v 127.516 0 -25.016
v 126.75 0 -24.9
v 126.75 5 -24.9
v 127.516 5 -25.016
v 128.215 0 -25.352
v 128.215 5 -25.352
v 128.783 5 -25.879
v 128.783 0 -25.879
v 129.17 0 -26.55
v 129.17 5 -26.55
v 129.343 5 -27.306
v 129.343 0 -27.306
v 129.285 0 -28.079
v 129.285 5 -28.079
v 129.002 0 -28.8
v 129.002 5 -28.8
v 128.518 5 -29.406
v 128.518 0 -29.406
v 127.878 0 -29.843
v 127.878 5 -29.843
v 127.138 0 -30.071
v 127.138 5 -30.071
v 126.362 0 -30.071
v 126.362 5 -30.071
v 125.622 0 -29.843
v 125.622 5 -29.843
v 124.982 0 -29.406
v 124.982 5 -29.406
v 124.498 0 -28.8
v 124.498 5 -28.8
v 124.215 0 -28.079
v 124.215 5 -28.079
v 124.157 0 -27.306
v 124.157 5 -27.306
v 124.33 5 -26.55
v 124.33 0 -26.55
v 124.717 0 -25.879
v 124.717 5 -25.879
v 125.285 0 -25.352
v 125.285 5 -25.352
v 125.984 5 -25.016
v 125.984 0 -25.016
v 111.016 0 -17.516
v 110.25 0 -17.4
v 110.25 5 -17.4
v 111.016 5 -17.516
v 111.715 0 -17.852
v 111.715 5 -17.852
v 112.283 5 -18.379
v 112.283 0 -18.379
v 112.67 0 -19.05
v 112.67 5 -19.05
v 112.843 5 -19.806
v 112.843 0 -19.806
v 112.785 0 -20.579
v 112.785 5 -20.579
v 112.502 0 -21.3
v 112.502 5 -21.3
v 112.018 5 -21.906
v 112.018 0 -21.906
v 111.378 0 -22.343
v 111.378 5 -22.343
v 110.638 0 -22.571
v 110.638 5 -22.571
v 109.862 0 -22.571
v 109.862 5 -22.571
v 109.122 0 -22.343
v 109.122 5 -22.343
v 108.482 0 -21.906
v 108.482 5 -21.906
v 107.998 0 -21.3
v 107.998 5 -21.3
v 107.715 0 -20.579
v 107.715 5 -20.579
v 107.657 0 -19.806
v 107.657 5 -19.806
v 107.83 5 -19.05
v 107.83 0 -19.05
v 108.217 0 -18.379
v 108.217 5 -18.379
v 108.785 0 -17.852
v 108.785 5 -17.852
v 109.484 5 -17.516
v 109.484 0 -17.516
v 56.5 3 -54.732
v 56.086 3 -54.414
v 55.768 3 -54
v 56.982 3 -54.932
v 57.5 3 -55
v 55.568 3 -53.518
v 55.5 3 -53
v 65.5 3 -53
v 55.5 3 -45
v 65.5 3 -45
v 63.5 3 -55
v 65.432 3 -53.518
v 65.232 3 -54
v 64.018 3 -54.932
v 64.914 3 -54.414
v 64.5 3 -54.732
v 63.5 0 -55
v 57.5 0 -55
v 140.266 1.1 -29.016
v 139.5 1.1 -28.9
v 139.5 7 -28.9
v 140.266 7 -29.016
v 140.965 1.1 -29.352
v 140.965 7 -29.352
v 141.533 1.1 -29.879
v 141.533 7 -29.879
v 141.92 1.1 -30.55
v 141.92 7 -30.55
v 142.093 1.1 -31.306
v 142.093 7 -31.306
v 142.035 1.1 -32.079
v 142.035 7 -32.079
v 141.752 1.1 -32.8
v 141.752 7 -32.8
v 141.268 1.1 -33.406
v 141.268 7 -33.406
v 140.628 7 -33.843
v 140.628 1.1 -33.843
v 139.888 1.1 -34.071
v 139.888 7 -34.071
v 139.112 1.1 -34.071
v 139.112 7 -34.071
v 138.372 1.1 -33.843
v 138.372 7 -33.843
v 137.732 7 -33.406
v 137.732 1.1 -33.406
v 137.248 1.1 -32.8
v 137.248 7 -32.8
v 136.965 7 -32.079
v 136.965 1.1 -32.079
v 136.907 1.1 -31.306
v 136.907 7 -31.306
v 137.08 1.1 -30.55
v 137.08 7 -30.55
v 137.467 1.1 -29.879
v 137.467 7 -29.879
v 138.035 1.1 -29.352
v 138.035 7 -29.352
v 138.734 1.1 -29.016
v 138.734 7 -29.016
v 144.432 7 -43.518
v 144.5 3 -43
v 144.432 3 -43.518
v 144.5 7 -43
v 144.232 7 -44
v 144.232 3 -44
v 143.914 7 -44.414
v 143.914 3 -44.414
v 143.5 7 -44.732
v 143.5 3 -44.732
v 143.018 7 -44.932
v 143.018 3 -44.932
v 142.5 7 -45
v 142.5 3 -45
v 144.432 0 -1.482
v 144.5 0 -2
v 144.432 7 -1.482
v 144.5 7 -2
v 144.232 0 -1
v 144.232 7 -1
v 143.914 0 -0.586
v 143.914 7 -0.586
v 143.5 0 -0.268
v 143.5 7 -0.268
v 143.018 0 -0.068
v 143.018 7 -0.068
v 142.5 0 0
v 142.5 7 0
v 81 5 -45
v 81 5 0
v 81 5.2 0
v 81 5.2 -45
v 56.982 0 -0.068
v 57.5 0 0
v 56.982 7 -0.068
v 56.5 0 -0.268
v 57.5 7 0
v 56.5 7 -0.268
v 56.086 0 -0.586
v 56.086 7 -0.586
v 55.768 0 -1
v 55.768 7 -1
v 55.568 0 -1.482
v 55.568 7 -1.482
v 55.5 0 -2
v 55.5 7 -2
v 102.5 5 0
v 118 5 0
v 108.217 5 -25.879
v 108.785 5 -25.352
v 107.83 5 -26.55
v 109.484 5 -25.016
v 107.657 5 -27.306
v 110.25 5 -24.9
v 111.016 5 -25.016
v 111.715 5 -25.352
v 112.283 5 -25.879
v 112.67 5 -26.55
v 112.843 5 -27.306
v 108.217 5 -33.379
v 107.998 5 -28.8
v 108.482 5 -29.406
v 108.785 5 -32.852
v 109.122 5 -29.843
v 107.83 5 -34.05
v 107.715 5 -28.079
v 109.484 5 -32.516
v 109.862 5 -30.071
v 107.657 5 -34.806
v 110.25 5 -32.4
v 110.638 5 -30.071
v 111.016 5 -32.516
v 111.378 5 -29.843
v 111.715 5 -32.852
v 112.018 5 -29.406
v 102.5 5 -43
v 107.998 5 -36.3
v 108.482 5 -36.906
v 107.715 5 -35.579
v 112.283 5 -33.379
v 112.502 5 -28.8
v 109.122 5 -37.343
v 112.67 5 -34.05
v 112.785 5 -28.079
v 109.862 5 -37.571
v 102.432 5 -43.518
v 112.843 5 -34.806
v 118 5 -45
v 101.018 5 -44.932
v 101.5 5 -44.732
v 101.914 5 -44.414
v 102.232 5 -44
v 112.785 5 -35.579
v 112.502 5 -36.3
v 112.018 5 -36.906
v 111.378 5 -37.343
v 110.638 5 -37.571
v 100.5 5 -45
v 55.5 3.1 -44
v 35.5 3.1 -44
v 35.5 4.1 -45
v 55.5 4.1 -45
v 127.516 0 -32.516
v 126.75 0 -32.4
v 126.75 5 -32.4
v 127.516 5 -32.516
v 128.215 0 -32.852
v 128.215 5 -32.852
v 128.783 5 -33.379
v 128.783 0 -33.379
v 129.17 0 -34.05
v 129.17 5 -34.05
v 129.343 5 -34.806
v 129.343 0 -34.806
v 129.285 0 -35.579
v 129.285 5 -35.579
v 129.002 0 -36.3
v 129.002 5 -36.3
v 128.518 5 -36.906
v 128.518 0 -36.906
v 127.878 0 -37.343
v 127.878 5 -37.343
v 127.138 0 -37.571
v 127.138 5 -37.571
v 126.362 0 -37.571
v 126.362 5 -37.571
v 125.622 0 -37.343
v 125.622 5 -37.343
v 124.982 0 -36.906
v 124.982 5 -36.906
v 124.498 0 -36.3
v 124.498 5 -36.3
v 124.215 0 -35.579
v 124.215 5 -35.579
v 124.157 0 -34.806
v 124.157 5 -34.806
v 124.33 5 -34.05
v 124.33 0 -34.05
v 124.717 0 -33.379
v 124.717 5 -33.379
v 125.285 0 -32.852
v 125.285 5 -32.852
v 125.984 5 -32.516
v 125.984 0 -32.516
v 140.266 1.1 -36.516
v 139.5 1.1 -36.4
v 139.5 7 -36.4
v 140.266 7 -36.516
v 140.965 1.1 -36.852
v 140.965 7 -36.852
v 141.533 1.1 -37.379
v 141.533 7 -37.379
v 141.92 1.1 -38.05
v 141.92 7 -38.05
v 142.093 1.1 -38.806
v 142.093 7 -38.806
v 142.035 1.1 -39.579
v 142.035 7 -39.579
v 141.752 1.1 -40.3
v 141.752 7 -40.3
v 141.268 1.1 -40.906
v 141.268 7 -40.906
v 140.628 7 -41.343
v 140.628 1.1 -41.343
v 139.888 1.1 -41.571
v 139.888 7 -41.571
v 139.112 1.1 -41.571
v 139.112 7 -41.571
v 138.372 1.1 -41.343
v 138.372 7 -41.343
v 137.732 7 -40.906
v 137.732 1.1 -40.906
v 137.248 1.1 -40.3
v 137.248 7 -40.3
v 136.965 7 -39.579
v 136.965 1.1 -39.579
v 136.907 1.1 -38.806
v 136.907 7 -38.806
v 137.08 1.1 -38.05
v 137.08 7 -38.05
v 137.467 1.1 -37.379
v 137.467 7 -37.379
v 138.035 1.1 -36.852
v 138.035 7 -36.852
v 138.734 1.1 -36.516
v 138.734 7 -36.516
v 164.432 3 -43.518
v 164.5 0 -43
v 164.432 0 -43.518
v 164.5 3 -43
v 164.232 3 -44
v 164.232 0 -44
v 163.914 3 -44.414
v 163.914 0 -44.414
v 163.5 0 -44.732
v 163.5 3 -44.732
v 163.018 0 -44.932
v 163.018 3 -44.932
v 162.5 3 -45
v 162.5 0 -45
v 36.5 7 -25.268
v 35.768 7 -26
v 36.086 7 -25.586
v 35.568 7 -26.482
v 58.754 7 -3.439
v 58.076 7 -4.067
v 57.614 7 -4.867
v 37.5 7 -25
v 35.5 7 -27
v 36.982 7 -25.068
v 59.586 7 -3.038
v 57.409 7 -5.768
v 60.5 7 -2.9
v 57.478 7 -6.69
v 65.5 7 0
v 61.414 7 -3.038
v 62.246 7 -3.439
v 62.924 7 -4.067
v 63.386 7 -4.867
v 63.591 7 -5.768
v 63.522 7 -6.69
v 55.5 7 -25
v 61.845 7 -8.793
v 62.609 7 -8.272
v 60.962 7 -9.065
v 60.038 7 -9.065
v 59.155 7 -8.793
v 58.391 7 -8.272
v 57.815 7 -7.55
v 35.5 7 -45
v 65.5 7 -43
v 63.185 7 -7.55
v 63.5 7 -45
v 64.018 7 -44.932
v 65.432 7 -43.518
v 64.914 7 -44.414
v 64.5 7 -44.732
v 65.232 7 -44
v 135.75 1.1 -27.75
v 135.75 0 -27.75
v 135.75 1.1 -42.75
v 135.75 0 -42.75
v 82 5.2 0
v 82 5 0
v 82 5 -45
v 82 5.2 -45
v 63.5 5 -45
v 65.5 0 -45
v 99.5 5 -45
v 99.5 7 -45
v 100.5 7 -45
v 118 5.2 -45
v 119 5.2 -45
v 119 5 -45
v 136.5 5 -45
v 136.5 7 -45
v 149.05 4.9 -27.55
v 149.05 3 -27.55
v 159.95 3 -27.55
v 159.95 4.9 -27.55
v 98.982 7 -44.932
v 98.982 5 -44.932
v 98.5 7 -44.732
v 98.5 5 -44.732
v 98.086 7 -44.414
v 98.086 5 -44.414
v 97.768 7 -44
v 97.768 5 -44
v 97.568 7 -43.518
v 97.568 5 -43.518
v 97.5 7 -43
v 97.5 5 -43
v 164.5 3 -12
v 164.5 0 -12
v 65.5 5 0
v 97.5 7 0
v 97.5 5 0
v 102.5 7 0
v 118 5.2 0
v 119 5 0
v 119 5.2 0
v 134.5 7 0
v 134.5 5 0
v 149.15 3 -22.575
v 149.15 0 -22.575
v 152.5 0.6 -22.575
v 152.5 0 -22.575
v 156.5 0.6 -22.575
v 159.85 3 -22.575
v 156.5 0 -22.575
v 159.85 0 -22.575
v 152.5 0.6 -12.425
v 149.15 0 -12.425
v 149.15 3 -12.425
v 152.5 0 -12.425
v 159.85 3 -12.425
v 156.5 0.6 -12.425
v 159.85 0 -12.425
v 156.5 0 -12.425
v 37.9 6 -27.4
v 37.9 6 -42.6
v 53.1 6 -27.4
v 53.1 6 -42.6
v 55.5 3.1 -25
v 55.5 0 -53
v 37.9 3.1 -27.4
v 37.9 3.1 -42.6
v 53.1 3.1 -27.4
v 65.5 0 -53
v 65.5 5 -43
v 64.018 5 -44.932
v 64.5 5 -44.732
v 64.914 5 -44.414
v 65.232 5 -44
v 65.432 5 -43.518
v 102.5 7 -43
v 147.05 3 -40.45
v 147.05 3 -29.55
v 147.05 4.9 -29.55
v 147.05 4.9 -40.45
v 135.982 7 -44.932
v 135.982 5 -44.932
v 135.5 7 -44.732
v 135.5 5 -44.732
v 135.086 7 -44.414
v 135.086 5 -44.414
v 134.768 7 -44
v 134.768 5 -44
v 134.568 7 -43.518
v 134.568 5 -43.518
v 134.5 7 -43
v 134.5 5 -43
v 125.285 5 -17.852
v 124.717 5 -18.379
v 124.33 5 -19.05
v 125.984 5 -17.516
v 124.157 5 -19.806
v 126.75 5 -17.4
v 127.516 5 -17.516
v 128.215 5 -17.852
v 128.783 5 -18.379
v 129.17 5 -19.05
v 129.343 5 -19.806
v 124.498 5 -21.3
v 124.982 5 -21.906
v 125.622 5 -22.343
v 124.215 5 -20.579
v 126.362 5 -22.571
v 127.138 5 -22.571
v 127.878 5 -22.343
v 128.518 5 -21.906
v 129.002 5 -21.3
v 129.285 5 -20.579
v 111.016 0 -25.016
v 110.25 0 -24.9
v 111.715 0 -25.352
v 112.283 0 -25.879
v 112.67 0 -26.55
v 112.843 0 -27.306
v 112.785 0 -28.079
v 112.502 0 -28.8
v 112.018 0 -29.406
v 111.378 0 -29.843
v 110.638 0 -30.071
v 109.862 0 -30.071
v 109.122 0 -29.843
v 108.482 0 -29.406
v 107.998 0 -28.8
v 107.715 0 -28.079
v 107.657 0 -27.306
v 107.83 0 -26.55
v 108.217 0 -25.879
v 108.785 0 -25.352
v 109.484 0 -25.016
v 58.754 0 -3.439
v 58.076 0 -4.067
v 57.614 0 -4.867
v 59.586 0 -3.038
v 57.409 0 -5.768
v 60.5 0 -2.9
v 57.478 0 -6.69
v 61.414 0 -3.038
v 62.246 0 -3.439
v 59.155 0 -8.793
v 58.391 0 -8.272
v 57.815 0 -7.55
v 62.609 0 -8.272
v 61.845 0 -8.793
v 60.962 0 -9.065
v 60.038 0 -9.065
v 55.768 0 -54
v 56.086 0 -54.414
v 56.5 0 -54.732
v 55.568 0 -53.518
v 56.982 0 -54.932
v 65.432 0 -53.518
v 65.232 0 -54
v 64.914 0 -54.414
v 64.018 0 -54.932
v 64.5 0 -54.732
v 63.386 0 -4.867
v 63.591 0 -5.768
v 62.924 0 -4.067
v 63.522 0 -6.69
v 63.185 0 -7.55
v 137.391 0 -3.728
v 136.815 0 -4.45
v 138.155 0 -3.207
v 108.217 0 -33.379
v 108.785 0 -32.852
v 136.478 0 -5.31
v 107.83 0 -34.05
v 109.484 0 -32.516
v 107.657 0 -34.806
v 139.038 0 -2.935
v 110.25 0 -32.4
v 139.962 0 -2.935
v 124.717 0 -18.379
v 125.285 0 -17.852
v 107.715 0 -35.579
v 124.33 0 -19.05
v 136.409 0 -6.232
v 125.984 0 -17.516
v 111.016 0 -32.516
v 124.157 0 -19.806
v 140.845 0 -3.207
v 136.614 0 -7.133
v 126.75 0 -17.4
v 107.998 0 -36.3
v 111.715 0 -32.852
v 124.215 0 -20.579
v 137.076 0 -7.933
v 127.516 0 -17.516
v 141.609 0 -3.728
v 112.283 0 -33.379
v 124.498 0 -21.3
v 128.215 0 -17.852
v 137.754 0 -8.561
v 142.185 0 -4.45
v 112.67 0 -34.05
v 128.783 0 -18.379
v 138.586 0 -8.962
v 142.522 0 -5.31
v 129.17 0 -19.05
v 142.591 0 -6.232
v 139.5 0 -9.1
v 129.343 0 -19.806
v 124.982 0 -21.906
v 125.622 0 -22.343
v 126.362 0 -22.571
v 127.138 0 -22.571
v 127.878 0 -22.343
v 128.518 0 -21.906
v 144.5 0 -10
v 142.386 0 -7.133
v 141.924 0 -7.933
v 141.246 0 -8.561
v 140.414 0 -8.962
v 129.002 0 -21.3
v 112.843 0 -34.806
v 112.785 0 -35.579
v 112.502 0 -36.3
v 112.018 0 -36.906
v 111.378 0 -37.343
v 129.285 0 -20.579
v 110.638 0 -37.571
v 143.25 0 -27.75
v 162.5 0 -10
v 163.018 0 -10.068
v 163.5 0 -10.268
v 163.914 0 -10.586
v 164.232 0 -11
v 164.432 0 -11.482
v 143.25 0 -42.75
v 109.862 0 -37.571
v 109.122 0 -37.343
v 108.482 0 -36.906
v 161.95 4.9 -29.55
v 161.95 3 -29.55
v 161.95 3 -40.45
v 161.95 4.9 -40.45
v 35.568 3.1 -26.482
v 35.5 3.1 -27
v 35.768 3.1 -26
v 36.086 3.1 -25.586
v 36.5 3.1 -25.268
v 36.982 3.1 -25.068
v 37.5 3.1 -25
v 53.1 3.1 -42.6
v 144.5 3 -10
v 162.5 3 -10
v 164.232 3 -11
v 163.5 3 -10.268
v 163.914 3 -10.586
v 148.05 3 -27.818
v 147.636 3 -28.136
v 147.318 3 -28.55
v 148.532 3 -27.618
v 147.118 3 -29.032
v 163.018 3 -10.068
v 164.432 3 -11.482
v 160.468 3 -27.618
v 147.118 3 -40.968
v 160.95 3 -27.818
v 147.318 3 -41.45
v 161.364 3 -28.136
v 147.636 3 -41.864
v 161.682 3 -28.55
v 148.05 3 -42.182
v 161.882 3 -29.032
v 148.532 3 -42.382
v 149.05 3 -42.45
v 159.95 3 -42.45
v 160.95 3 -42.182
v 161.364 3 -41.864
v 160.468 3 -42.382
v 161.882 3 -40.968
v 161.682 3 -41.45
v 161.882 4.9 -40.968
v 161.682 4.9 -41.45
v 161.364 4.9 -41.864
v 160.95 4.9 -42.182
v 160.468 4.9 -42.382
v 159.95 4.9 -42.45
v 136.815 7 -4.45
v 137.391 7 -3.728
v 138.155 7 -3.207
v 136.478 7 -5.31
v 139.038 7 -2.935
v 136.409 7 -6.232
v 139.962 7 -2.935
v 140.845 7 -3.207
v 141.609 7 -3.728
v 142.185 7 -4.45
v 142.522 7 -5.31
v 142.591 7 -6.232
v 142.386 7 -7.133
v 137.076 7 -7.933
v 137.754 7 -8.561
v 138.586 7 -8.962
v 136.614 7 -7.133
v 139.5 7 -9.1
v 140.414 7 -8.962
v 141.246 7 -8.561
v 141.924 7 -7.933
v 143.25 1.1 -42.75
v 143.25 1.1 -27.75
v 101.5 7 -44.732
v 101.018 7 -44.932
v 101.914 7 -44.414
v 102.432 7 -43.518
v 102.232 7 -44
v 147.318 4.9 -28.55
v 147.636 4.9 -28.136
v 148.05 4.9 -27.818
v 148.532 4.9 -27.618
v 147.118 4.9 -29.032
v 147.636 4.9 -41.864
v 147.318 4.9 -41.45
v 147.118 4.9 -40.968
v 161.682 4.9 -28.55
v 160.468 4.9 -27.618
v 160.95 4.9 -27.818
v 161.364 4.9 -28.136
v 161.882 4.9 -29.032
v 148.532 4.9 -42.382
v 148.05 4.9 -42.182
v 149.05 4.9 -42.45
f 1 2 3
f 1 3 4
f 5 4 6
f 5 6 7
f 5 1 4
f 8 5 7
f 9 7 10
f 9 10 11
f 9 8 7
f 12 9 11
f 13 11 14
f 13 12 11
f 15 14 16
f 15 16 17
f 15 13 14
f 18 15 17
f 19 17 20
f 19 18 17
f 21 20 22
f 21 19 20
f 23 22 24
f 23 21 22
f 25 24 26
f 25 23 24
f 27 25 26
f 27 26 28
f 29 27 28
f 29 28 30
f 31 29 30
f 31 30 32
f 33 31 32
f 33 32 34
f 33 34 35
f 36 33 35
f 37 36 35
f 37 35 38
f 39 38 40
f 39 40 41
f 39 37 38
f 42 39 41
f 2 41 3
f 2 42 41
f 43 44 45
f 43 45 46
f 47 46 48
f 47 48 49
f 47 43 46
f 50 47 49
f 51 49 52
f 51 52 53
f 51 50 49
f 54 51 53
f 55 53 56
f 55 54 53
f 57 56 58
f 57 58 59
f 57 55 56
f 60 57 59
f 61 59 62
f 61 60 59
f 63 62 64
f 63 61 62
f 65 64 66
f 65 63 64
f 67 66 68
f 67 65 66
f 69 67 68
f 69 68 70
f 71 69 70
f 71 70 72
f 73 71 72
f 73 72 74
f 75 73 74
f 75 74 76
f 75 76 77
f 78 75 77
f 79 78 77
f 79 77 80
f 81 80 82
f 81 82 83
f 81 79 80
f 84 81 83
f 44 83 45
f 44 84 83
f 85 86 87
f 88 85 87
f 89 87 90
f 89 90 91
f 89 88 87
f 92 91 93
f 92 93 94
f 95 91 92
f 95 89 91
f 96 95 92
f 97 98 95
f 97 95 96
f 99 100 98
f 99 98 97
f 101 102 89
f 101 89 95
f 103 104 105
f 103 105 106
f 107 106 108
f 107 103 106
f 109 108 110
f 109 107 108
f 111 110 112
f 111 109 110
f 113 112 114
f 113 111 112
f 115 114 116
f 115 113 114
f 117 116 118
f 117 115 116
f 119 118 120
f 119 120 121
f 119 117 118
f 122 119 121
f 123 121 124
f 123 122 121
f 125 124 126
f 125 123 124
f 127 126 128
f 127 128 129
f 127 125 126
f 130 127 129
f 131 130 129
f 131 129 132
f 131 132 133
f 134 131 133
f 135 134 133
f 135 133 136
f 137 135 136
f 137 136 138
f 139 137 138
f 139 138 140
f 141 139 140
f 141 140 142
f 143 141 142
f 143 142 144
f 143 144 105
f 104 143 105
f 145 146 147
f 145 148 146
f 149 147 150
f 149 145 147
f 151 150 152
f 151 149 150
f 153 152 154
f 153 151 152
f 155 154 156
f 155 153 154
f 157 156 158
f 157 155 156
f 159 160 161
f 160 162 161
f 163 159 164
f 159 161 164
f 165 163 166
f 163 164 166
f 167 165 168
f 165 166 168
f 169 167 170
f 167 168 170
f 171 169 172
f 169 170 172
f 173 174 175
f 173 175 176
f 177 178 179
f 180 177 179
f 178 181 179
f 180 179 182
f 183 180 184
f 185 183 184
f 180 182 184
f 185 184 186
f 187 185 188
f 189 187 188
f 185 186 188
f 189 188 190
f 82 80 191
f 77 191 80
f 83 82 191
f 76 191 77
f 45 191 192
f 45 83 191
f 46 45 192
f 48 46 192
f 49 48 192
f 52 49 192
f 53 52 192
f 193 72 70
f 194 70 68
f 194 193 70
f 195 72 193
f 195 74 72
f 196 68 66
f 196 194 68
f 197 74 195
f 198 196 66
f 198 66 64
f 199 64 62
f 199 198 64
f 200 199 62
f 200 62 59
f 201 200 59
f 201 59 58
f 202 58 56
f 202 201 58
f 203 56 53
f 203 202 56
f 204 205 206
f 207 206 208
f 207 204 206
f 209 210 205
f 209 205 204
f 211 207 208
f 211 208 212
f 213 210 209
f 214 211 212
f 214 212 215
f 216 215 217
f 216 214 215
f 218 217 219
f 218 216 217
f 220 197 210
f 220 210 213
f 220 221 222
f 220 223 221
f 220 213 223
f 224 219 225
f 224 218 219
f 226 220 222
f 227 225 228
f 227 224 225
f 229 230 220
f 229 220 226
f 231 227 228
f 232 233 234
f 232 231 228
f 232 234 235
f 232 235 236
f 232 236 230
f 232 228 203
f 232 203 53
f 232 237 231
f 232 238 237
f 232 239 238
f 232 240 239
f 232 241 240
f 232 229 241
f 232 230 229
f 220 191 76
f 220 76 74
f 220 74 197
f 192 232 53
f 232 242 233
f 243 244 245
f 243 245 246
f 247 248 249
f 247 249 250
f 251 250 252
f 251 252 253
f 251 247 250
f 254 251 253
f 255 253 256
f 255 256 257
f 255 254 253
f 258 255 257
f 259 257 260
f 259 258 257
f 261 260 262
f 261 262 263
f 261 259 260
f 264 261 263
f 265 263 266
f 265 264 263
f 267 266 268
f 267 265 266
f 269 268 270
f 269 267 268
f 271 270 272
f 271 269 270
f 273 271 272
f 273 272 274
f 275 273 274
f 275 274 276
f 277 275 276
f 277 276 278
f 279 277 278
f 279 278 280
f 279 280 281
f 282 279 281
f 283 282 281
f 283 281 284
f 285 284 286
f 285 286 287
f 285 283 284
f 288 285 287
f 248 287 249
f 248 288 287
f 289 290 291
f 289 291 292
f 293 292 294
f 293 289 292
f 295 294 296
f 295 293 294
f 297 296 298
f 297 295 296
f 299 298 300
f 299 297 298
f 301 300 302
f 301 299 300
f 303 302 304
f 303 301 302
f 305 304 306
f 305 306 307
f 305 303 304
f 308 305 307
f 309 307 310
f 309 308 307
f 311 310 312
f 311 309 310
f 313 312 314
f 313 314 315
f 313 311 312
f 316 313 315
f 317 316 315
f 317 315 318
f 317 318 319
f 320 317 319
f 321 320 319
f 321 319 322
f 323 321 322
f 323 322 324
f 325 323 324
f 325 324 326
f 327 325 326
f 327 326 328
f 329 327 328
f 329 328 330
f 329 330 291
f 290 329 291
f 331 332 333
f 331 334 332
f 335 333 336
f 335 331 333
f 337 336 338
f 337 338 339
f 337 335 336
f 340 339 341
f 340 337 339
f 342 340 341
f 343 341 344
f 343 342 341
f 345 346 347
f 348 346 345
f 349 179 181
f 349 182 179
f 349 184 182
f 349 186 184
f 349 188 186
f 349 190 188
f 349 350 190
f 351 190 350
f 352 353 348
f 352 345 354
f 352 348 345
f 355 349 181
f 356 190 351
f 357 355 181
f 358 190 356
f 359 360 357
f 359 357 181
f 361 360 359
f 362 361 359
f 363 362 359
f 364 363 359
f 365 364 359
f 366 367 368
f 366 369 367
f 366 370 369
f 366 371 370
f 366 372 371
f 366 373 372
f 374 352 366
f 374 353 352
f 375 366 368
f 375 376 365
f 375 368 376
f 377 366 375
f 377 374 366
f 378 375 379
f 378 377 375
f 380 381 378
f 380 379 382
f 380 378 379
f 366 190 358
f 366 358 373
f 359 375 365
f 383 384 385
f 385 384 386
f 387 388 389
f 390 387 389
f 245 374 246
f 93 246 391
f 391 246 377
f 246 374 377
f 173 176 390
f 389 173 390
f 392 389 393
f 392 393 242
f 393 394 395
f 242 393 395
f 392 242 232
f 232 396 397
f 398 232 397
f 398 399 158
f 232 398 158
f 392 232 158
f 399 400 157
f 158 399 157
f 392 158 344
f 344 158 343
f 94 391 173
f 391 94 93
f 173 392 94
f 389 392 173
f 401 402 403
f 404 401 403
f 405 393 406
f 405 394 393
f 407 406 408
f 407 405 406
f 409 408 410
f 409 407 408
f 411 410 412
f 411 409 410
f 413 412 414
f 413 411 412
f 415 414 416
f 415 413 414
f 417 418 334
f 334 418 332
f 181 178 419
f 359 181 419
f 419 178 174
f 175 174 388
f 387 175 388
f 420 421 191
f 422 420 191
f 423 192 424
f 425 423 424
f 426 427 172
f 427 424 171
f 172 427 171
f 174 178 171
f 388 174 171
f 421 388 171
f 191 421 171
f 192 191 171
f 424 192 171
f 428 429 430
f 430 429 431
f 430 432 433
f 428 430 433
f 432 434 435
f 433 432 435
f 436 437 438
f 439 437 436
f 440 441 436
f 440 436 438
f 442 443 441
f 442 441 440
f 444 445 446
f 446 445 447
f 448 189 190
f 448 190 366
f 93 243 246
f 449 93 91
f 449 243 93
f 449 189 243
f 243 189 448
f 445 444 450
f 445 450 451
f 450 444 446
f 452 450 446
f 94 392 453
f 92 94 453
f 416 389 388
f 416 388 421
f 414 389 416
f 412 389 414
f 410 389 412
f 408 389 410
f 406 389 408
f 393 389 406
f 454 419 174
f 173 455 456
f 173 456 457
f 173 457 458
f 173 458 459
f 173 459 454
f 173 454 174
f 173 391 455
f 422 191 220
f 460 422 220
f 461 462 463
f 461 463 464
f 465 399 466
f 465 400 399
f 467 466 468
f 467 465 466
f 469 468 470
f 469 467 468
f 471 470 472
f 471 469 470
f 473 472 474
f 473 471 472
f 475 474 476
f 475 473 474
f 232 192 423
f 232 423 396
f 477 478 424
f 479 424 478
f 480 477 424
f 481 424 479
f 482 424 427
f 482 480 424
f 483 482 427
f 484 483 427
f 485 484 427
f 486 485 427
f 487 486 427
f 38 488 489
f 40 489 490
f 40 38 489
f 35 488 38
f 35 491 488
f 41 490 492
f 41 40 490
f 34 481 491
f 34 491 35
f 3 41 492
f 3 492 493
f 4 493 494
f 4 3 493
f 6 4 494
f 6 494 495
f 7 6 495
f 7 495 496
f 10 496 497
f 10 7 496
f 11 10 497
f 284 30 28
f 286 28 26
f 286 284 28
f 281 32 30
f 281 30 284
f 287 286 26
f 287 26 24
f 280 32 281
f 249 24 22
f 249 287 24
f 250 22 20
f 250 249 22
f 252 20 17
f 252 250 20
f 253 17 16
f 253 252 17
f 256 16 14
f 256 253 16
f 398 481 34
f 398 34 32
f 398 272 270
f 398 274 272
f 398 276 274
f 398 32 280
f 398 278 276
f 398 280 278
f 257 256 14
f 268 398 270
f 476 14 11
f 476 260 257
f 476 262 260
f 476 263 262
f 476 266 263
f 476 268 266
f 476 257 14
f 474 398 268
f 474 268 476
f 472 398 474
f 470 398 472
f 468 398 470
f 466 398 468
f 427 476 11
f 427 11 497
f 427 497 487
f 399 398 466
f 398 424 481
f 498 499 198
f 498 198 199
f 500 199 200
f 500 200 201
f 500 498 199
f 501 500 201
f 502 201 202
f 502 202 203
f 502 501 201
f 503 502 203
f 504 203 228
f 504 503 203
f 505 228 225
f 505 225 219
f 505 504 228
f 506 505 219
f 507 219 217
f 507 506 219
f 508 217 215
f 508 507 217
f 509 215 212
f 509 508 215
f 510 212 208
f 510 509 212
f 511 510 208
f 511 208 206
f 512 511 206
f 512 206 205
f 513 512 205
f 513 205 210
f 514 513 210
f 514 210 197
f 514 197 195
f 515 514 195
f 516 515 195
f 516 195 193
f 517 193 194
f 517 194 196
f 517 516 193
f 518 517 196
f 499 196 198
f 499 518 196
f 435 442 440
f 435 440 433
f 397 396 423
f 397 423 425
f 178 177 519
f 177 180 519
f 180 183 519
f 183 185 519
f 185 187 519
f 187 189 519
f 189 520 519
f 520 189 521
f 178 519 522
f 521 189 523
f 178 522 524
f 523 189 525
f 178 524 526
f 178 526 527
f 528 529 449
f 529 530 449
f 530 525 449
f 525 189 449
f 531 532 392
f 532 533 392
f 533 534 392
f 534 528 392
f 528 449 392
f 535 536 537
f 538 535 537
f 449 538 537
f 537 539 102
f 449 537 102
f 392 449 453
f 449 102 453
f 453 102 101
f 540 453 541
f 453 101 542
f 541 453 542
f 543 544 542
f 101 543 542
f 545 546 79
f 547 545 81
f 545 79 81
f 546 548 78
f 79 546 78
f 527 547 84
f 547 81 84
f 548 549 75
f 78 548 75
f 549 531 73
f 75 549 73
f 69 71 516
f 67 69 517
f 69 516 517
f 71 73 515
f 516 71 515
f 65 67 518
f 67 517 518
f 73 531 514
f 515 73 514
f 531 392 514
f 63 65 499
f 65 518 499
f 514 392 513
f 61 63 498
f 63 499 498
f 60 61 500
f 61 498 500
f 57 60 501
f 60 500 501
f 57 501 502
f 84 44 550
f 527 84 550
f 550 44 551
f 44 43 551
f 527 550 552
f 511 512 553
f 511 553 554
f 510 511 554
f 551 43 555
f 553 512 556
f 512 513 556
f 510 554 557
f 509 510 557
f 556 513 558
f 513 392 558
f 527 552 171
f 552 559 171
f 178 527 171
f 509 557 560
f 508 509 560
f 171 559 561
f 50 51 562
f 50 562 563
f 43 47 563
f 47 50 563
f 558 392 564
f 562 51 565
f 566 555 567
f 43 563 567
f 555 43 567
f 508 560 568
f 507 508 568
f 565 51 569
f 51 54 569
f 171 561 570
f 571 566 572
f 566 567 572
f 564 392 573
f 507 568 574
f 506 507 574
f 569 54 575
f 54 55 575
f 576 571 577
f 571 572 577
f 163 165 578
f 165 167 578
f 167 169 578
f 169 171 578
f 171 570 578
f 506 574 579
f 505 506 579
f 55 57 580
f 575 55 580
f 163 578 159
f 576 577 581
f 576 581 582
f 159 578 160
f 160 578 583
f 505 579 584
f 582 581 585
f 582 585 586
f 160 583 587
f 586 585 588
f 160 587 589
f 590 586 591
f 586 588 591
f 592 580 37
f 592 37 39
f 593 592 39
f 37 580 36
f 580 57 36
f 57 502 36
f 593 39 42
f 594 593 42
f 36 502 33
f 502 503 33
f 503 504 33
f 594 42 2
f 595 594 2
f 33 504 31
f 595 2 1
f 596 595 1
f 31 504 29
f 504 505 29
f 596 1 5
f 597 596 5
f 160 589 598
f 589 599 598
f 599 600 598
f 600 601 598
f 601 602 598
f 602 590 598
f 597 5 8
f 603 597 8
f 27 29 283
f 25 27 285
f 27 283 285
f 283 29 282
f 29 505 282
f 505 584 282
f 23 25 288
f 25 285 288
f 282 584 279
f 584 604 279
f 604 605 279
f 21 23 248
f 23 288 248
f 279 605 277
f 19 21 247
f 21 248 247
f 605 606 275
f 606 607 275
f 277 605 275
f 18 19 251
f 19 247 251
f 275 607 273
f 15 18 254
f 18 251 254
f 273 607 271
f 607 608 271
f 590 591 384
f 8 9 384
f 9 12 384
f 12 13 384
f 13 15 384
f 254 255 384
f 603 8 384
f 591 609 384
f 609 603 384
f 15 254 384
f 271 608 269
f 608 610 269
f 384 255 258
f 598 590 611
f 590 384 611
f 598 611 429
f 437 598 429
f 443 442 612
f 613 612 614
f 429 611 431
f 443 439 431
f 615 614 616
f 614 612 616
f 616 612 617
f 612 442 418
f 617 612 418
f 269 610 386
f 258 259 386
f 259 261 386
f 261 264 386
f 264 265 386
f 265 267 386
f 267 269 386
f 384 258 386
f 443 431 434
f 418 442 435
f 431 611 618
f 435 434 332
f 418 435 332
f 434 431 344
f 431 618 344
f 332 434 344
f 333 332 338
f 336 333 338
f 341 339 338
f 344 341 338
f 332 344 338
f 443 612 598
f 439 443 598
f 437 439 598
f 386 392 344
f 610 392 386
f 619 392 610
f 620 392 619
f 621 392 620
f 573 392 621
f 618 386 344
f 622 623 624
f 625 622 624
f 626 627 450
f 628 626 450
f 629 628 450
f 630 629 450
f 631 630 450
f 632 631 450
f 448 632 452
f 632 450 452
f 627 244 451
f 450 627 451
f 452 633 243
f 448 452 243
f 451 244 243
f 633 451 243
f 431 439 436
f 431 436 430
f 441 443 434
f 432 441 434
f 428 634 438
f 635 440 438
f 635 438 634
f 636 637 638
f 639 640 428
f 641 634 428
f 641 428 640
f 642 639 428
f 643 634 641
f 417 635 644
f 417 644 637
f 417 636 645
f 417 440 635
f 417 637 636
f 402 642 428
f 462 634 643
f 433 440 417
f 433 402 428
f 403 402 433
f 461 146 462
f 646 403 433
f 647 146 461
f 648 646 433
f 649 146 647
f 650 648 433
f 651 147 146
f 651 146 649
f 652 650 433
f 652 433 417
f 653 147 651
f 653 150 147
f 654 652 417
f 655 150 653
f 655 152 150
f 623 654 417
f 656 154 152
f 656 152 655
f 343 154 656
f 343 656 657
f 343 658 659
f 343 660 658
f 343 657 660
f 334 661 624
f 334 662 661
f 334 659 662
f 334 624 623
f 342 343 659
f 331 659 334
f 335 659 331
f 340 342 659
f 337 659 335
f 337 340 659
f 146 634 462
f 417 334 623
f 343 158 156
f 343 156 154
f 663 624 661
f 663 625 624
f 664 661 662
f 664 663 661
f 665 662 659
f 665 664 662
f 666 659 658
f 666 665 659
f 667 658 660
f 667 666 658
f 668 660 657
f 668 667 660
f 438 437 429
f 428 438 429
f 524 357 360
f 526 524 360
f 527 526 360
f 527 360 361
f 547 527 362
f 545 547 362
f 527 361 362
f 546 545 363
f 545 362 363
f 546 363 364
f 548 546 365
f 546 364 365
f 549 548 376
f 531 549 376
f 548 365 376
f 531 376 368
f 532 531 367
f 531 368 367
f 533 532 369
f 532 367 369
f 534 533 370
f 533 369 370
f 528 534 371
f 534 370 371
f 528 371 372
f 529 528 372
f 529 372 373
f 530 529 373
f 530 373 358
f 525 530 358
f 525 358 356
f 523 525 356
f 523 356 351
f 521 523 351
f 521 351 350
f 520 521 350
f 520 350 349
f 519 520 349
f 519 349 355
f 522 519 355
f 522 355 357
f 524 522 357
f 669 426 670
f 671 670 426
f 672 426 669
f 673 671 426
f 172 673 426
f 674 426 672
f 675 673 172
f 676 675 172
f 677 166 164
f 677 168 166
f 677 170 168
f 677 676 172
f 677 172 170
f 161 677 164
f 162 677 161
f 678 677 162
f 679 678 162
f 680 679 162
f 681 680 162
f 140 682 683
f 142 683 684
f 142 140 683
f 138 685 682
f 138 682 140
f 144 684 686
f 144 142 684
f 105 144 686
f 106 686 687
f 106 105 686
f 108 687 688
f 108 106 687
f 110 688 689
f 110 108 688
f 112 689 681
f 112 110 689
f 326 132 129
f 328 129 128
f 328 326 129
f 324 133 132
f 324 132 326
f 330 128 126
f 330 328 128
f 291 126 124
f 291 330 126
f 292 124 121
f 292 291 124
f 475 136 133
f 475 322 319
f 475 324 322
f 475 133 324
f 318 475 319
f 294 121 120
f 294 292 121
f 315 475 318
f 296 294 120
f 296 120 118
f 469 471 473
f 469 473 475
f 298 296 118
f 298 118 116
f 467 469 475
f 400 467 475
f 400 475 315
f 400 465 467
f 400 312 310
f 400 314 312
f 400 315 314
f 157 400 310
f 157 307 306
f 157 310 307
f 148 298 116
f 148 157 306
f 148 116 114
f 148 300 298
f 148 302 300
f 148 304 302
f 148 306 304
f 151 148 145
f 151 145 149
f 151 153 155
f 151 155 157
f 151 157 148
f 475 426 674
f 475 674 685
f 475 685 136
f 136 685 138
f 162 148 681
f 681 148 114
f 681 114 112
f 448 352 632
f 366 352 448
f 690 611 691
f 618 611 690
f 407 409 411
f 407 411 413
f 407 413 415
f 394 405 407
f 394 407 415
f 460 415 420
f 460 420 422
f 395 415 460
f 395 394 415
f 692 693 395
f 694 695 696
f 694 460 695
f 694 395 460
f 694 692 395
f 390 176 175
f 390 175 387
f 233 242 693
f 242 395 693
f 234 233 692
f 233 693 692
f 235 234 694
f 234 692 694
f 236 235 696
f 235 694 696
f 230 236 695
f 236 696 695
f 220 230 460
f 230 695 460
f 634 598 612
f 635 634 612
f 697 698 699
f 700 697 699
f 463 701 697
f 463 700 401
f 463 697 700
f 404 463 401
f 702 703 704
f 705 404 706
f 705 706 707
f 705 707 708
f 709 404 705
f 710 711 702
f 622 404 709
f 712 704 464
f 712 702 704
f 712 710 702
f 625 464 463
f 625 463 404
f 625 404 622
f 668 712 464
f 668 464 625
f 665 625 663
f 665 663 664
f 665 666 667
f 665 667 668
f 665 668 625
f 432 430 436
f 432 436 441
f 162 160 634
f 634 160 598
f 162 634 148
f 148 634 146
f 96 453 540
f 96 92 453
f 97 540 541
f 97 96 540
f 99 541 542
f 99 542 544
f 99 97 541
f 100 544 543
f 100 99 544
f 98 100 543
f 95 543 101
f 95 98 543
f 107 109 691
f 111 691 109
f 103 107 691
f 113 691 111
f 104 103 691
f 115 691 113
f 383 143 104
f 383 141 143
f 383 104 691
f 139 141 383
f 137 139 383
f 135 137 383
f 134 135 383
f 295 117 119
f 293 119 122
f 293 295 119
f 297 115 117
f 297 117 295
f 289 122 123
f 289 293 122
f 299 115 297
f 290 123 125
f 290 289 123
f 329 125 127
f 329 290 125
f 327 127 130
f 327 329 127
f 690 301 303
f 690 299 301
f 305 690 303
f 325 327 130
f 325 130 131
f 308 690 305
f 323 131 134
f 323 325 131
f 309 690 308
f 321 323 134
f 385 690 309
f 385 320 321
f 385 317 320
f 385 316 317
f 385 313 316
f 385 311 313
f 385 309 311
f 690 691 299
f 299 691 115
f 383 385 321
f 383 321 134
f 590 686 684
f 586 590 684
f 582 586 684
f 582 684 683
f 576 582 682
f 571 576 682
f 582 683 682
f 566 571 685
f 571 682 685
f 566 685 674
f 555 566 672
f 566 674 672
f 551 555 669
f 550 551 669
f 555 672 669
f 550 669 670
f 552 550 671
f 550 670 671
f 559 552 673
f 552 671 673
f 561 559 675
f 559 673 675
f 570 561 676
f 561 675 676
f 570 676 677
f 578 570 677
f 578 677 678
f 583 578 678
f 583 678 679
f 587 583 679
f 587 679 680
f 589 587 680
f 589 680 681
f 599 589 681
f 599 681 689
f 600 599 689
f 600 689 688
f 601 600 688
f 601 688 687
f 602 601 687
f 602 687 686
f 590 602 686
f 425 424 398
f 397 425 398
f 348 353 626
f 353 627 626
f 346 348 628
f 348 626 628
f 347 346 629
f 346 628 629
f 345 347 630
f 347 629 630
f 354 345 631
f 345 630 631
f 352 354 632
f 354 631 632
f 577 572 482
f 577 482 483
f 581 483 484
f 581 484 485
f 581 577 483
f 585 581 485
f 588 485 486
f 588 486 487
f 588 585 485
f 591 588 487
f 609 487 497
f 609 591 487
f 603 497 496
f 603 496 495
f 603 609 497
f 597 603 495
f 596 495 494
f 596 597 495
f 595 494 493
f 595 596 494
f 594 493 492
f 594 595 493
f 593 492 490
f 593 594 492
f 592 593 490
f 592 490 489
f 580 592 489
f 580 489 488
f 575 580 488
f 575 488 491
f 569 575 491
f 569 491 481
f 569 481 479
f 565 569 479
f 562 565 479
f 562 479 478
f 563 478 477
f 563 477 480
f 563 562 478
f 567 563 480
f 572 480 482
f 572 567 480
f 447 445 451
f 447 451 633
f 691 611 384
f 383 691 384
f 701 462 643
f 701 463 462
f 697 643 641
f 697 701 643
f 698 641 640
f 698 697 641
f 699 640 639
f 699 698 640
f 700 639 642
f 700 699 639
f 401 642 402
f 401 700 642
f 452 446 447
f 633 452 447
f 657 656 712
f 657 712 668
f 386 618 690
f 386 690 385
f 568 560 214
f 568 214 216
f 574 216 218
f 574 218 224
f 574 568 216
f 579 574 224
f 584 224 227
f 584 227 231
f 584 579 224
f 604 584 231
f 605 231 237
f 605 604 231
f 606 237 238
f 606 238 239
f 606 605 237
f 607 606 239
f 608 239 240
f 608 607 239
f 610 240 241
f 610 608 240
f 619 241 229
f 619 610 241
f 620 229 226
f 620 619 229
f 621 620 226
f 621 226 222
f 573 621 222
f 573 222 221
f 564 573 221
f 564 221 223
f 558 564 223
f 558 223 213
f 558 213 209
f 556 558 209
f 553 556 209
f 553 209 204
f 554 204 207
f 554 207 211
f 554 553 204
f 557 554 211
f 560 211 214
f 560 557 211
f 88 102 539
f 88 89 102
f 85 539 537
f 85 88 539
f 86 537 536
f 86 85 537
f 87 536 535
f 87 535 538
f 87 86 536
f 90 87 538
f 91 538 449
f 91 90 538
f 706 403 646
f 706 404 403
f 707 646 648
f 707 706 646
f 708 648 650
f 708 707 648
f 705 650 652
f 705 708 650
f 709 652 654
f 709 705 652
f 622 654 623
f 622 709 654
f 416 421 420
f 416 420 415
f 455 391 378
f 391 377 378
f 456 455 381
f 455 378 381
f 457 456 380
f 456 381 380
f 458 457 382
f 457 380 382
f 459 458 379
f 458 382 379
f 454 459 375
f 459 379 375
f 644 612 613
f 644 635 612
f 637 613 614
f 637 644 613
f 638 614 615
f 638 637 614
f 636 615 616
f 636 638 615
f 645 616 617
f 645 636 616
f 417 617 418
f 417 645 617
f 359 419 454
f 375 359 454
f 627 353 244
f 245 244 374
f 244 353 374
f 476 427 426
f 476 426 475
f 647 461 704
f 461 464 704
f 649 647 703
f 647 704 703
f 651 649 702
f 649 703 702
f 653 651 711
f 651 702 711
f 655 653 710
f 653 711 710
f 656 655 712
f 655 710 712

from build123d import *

# Parameters (mm, degrees)
SKETCH1_W             = 15.5
SKETCH1_H             = 45
BOSS_EXTRUDE1_DEPTH   = 5
BOSS_EXTRUDE1_2_DEPTH = 5
SKETCH1_R             = 2.6
BOSS_EXTRUDE1_3_DEPTH = 5
BOSS_EXTRUDE1_4_DEPTH = 5
SKETCH1_3_W           = 1
SKETCH1_3_H           = 45
BOSS_EXTRUDE2_DEPTH   = 5.2
SKETCH1_4_W           = 5
SKETCH1_4_H           = 45
SKETCH1_4_W_2         = 10
SKETCH1_4_R           = 2.6
BOSS_EXTRUDE3_DEPTH   = 7
SKETCH2_W             = 7.5
SKETCH2_H             = 15
CUT_EXTRUDE1_DEPTH    = 1.1
SKETCH3_R             = 3.1
CUT_EXTRUDE2_DEPTH    = 152.506600516
SKETCH5_W             = 20
SKETCH5_H             = 20
SKETCH5_W_2           = 14.9
SKETCH5_H_2           = 14.9
BOSS_EXTRUDE4_DEPTH   = 3
SKETCH5_3_W           = 14.9
SKETCH5_3_H           = 14.9
BOSS_EXTRUDE5_DEPTH   = 4.9
BOSS_EXTRUDE6_START   = 7
SKETCH5_4_W           = 20
SKETCH5_4_H           = 20
SKETCH5_4_W_2         = 15.2
SKETCH5_4_H_2         = 15.2
BOSS_EXTRUDE6_DEPTH   = 3.9
BOSS_EXTRUDE7_START   = 7
SKETCH5_5_W           = 15.2
SKETCH5_5_H           = 15.2
BOSS_EXTRUDE7_DEPTH   = 1
FILLET1_R             = 2
BOSS_EXTRUDE8_START   = -7
SKETCH6_W             = 10
SKETCH6_H             = 10
BOSS_EXTRUDE8_DEPTH   = 3
CHAMFER1_SIZE         = 1
SKETCH8_W             = 20
SKETCH8_H             = 15
SKETCH8_W_2           = 10.7
SKETCH8_H_2           = 10.15
BOSS_EXTRUDE9_DEPTH   = 3
SKETCH8_3_W           = 4
SKETCH8_3_H           = 10.15
BOSS_EXTRUDE10_DEPTH  = 0.6
FILLET3_R             = 2


with BuildPart() as part:
    # Sketch1 → Boss-Extrude1 (new body)
    with BuildSketch(Plane(origin=(0, 0, 0), x_dir=(1, 0, 0), z_dir=(0, 1, 0))):
        with Locations((73.25, 22.5)):
            Rectangle(SKETCH1_W, SKETCH1_H)
    extrude(amount=BOSS_EXTRUDE1_DEPTH)



with BuildPart() as body_2:
    # Sketch1 → Boss-Extrude1 2 (new body)
    with BuildSketch(Plane(origin=(0, 0, 0), x_dir=(1, 0, 0), z_dir=(0, 1, 0))):
        with Locations((89.75, 22.5)):
            Rectangle(SKETCH1_W, SKETCH1_H)
    extrude(amount=BOSS_EXTRUDE1_2_DEPTH)


with BuildPart() as body_3:
    # Sketch1 → Boss-Extrude1 3 (new body)
    with BuildSketch(Plane(origin=(0, 0, 0), x_dir=(1, 0, 0), z_dir=(0, 1, 0))):
        with Locations((110.25, 22.5)):
            Rectangle(SKETCH1_W, SKETCH1_H)
        with Locations(Location((110.25, 20, 0), (0, 0, 270))):
            Circle(SKETCH1_R, mode=Mode.SUBTRACT)
        with Locations(Location((110.25, 27.5, 0), (0, 0, 270))):
            Circle(SKETCH1_R, mode=Mode.SUBTRACT)
        with Locations(Location((110.25, 35, 0), (0, 0, 270))):
            Circle(SKETCH1_R, mode=Mode.SUBTRACT)
    extrude(amount=BOSS_EXTRUDE1_3_DEPTH)


with BuildPart() as body_4:
    # Sketch1 → Boss-Extrude1 4 (new body)
    with BuildSketch(Plane(origin=(0, 0, 0), x_dir=(1, 0, 0), z_dir=(0, 1, 0))):
        with Locations((126.75, 22.5)):
            Rectangle(SKETCH1_W, SKETCH1_H)
        with Locations(Location((126.75, 20, 0), (0, 0, 270))):
            Circle(SKETCH1_R, mode=Mode.SUBTRACT)
        with Locations(Location((126.75, 27.5, 0), (0, 0, 270))):
            Circle(SKETCH1_R, mode=Mode.SUBTRACT)
        with Locations(Location((126.75, 35, 0), (0, 0, 270))):
            Circle(SKETCH1_R, mode=Mode.SUBTRACT)
    extrude(amount=BOSS_EXTRUDE1_4_DEPTH)


with BuildPart() as part_1:
    add(part.part)

    add(body_2.part)  # Boss-Extrude2 merges body 2

    add(body_3.part)  # Boss-Extrude2 merges body 3

    add(body_4.part)  # Boss-Extrude2 merges body 4
    # Sketch1<3> → Boss-Extrude2 (add)
    with BuildSketch(Plane(origin=(0, 0, 0), x_dir=(1, 0, 0), z_dir=(0, 1, 0))):
        with Locations((81.5, 22.5)):
            Rectangle(SKETCH1_3_W, SKETCH1_3_H)
        with Locations((118.5, 22.5)):
            Rectangle(SKETCH1_3_W, SKETCH1_3_H)
    extrude(amount=BOSS_EXTRUDE2_DEPTH)

    # Sketch1<4> → Boss-Extrude3 (add)
    # profile 1 of 3: a face of its own
    with BuildSketch(Plane(origin=(0, 0, 0), x_dir=(1, 0, 0), z_dir=(0, 1, 0))):
        with Locations((100, 22.5)):
            Rectangle(SKETCH1_4_W, SKETCH1_4_H)
    # profile 2 of 3: a face of its own
    with BuildSketch(Plane(origin=(0, 0, 0), x_dir=(1, 0, 0), z_dir=(0, 1, 0))):
        with Locations((139.5, 22.5)):
            Rectangle(SKETCH1_4_W_2, SKETCH1_4_H)
        with Locations(Location((139.5, 31.5, 0), (0, 0, 270))):
            Circle(SKETCH1_4_R, mode=Mode.SUBTRACT)
        with Locations(Location((139.5, 39, 0), (0, 0, 270))):
            Circle(SKETCH1_4_R, mode=Mode.SUBTRACT)
    # profile 3 of 3: a face of its own
    with BuildSketch(Plane(origin=(0, 0, 0), x_dir=(1, 0, 0), z_dir=(0, 1, 0))):
        with Locations((60.5, 22.5)):
            Rectangle(SKETCH1_4_W_2, SKETCH1_4_H)
    extrude(amount=BOSS_EXTRUDE3_DEPTH)

    # Sketch2 → Cut-Extrude1 (cut)
    with BuildSketch(Plane(origin=(0, 0, 0), x_dir=(-1, 0, 0), z_dir=(0, -1, 0))):
        with Locations((-139.5, 35.25)):
            Rectangle(SKETCH2_W, SKETCH2_H)
    extrude(amount=-CUT_EXTRUDE1_DEPTH, mode=Mode.SUBTRACT)

    # Sketch3 → Cut-Extrude2 (cut, through all)
    with BuildSketch(Plane(origin=(0, 7, 0), x_dir=(1, 0, 0), z_dir=(0, 1, 0))):
        with Locations(Location((60.5, 6, 0), (0, 0, 270))):
            Circle(SKETCH3_R)
        with Locations(Location((139.5, 6, 0), (0, 0, 90))):
            Circle(SKETCH3_R)
    extrude(amount=-CUT_EXTRUDE2_DEPTH, mode=Mode.SUBTRACT)

    # Sketch5 → Boss-Extrude4 (add)
    # profile 1 of 2: a face of its own
    with BuildSketch(Plane(origin=(0, 0, 0), x_dir=(1, 0, 0), z_dir=(0, 1, 0))):
        with Locations((154.5, 35)):
            Rectangle(SKETCH5_W, SKETCH5_H)
        with Locations((154.5, 35)):
            Rectangle(SKETCH5_W_2, SKETCH5_H_2, mode=Mode.SUBTRACT)
    # profile 2 of 2: a face of its own
    with BuildSketch(Plane(origin=(0, 0, 0), x_dir=(1, 0, 0), z_dir=(0, 1, 0))):
        with Locations((154.5, 35)):
            Rectangle(SKETCH5_W_2, SKETCH5_H_2)
    extrude(amount=BOSS_EXTRUDE4_DEPTH)

    # Sketch5<3> → Boss-Extrude5 (add)
    with BuildSketch(Plane(origin=(0, 0, 0), x_dir=(1, 0, 0), z_dir=(0, 1, 0))):
        with Locations((154.5, 35)):
            Rectangle(SKETCH5_3_W, SKETCH5_3_H)
    extrude(amount=BOSS_EXTRUDE5_DEPTH)

    # Sketch5<4> → Boss-Extrude6 (add)
    with BuildSketch(Plane(origin=(0, 0, 0), x_dir=(1, 0, 0), z_dir=(0, 1, 0)).offset(BOSS_EXTRUDE6_START)):
        with Locations((45.5, 35)):
            Rectangle(SKETCH5_4_W, SKETCH5_4_H)
        with Locations((45.5, 35)):
            Rectangle(SKETCH5_4_W_2, SKETCH5_4_H_2, mode=Mode.SUBTRACT)
    extrude(amount=-BOSS_EXTRUDE6_DEPTH)

    # Sketch5<5> → Boss-Extrude7 (add)
    with BuildSketch(Plane(origin=(0, 0, 0), x_dir=(1, 0, 0), z_dir=(0, 1, 0)).offset(BOSS_EXTRUDE7_START)):
        with Locations((45.5, 35)):
            Rectangle(SKETCH5_5_W, SKETCH5_5_H)
    extrude(amount=-BOSS_EXTRUDE7_DEPTH)

    # Fillet1
    fillet1_edges = [part_1.edges().sort_by_distance(p)[0] for p in [
        (161.95, 3.95, -42.45),
        (147.05, 3.95, -42.45),
        (147.05, 3.95, -27.55),
        (161.95, 3.95, -27.55),
    ]]
    fillet(fillet1_edges, radius=FILLET1_R)

    # Sketch6 → Boss-Extrude8 (add)
    with BuildSketch(Plane(origin=(0, 7, 0), x_dir=(1, 0, 0), z_dir=(0, 1, 0)).offset(BOSS_EXTRUDE8_START)):
        with Locations((60.5, 50)):
            Rectangle(SKETCH6_W, SKETCH6_H)
    extrude(amount=BOSS_EXTRUDE8_DEPTH)

    # Chamfer1
    chamfer1_edges = [part_1.edges().sort_by_distance(p)[0] for p in [
        (45.5, 3.1, -45),
    ]]
    chamfer(chamfer1_edges, length=CHAMFER1_SIZE)

    # Sketch8 → Boss-Extrude9 (add)
    with BuildSketch(Plane(origin=(0, 0, 0), x_dir=(1, 0, 0), z_dir=(0, 1, 0))):
        with Locations((154.5, 17.5)):
            Rectangle(SKETCH8_W, SKETCH8_H)
        with Locations((154.5, 17.5)):
            Rectangle(SKETCH8_W_2, SKETCH8_H_2, mode=Mode.SUBTRACT)
    extrude(amount=BOSS_EXTRUDE9_DEPTH)

    # Sketch8<3> → Boss-Extrude10 (add)
    with BuildSketch(Plane(origin=(0, 0, 0), x_dir=(1, 0, 0), z_dir=(0, 1, 0))):
        with Locations((154.5, 17.5)):
            Rectangle(SKETCH8_3_W, SKETCH8_3_H)
    extrude(amount=BOSS_EXTRUDE10_DEPTH)

    # Fillet3
    fillet3_edges = [part_1.edges().sort_by_distance(p)[0] for p in [
        (164.5, 1.5, -45),
        (35.5, 5.05, -25),
        (65.5, 1.5, -55),
        (55.5, 1.5, -55),
        (164.5, 1.5, -10),
        (97.5, 6, -45),
        (102.5, 6, -45),
        (134.5, 6, -45),
        (144.5, 3.5, 0),
        (144.5, 5, -45),
        (55.5, 3.5, 0),
        (65.5, 6, -45),
    ]]
    fillet(fillet3_edges, radius=FILLET3_R)


solid = part_1.part
